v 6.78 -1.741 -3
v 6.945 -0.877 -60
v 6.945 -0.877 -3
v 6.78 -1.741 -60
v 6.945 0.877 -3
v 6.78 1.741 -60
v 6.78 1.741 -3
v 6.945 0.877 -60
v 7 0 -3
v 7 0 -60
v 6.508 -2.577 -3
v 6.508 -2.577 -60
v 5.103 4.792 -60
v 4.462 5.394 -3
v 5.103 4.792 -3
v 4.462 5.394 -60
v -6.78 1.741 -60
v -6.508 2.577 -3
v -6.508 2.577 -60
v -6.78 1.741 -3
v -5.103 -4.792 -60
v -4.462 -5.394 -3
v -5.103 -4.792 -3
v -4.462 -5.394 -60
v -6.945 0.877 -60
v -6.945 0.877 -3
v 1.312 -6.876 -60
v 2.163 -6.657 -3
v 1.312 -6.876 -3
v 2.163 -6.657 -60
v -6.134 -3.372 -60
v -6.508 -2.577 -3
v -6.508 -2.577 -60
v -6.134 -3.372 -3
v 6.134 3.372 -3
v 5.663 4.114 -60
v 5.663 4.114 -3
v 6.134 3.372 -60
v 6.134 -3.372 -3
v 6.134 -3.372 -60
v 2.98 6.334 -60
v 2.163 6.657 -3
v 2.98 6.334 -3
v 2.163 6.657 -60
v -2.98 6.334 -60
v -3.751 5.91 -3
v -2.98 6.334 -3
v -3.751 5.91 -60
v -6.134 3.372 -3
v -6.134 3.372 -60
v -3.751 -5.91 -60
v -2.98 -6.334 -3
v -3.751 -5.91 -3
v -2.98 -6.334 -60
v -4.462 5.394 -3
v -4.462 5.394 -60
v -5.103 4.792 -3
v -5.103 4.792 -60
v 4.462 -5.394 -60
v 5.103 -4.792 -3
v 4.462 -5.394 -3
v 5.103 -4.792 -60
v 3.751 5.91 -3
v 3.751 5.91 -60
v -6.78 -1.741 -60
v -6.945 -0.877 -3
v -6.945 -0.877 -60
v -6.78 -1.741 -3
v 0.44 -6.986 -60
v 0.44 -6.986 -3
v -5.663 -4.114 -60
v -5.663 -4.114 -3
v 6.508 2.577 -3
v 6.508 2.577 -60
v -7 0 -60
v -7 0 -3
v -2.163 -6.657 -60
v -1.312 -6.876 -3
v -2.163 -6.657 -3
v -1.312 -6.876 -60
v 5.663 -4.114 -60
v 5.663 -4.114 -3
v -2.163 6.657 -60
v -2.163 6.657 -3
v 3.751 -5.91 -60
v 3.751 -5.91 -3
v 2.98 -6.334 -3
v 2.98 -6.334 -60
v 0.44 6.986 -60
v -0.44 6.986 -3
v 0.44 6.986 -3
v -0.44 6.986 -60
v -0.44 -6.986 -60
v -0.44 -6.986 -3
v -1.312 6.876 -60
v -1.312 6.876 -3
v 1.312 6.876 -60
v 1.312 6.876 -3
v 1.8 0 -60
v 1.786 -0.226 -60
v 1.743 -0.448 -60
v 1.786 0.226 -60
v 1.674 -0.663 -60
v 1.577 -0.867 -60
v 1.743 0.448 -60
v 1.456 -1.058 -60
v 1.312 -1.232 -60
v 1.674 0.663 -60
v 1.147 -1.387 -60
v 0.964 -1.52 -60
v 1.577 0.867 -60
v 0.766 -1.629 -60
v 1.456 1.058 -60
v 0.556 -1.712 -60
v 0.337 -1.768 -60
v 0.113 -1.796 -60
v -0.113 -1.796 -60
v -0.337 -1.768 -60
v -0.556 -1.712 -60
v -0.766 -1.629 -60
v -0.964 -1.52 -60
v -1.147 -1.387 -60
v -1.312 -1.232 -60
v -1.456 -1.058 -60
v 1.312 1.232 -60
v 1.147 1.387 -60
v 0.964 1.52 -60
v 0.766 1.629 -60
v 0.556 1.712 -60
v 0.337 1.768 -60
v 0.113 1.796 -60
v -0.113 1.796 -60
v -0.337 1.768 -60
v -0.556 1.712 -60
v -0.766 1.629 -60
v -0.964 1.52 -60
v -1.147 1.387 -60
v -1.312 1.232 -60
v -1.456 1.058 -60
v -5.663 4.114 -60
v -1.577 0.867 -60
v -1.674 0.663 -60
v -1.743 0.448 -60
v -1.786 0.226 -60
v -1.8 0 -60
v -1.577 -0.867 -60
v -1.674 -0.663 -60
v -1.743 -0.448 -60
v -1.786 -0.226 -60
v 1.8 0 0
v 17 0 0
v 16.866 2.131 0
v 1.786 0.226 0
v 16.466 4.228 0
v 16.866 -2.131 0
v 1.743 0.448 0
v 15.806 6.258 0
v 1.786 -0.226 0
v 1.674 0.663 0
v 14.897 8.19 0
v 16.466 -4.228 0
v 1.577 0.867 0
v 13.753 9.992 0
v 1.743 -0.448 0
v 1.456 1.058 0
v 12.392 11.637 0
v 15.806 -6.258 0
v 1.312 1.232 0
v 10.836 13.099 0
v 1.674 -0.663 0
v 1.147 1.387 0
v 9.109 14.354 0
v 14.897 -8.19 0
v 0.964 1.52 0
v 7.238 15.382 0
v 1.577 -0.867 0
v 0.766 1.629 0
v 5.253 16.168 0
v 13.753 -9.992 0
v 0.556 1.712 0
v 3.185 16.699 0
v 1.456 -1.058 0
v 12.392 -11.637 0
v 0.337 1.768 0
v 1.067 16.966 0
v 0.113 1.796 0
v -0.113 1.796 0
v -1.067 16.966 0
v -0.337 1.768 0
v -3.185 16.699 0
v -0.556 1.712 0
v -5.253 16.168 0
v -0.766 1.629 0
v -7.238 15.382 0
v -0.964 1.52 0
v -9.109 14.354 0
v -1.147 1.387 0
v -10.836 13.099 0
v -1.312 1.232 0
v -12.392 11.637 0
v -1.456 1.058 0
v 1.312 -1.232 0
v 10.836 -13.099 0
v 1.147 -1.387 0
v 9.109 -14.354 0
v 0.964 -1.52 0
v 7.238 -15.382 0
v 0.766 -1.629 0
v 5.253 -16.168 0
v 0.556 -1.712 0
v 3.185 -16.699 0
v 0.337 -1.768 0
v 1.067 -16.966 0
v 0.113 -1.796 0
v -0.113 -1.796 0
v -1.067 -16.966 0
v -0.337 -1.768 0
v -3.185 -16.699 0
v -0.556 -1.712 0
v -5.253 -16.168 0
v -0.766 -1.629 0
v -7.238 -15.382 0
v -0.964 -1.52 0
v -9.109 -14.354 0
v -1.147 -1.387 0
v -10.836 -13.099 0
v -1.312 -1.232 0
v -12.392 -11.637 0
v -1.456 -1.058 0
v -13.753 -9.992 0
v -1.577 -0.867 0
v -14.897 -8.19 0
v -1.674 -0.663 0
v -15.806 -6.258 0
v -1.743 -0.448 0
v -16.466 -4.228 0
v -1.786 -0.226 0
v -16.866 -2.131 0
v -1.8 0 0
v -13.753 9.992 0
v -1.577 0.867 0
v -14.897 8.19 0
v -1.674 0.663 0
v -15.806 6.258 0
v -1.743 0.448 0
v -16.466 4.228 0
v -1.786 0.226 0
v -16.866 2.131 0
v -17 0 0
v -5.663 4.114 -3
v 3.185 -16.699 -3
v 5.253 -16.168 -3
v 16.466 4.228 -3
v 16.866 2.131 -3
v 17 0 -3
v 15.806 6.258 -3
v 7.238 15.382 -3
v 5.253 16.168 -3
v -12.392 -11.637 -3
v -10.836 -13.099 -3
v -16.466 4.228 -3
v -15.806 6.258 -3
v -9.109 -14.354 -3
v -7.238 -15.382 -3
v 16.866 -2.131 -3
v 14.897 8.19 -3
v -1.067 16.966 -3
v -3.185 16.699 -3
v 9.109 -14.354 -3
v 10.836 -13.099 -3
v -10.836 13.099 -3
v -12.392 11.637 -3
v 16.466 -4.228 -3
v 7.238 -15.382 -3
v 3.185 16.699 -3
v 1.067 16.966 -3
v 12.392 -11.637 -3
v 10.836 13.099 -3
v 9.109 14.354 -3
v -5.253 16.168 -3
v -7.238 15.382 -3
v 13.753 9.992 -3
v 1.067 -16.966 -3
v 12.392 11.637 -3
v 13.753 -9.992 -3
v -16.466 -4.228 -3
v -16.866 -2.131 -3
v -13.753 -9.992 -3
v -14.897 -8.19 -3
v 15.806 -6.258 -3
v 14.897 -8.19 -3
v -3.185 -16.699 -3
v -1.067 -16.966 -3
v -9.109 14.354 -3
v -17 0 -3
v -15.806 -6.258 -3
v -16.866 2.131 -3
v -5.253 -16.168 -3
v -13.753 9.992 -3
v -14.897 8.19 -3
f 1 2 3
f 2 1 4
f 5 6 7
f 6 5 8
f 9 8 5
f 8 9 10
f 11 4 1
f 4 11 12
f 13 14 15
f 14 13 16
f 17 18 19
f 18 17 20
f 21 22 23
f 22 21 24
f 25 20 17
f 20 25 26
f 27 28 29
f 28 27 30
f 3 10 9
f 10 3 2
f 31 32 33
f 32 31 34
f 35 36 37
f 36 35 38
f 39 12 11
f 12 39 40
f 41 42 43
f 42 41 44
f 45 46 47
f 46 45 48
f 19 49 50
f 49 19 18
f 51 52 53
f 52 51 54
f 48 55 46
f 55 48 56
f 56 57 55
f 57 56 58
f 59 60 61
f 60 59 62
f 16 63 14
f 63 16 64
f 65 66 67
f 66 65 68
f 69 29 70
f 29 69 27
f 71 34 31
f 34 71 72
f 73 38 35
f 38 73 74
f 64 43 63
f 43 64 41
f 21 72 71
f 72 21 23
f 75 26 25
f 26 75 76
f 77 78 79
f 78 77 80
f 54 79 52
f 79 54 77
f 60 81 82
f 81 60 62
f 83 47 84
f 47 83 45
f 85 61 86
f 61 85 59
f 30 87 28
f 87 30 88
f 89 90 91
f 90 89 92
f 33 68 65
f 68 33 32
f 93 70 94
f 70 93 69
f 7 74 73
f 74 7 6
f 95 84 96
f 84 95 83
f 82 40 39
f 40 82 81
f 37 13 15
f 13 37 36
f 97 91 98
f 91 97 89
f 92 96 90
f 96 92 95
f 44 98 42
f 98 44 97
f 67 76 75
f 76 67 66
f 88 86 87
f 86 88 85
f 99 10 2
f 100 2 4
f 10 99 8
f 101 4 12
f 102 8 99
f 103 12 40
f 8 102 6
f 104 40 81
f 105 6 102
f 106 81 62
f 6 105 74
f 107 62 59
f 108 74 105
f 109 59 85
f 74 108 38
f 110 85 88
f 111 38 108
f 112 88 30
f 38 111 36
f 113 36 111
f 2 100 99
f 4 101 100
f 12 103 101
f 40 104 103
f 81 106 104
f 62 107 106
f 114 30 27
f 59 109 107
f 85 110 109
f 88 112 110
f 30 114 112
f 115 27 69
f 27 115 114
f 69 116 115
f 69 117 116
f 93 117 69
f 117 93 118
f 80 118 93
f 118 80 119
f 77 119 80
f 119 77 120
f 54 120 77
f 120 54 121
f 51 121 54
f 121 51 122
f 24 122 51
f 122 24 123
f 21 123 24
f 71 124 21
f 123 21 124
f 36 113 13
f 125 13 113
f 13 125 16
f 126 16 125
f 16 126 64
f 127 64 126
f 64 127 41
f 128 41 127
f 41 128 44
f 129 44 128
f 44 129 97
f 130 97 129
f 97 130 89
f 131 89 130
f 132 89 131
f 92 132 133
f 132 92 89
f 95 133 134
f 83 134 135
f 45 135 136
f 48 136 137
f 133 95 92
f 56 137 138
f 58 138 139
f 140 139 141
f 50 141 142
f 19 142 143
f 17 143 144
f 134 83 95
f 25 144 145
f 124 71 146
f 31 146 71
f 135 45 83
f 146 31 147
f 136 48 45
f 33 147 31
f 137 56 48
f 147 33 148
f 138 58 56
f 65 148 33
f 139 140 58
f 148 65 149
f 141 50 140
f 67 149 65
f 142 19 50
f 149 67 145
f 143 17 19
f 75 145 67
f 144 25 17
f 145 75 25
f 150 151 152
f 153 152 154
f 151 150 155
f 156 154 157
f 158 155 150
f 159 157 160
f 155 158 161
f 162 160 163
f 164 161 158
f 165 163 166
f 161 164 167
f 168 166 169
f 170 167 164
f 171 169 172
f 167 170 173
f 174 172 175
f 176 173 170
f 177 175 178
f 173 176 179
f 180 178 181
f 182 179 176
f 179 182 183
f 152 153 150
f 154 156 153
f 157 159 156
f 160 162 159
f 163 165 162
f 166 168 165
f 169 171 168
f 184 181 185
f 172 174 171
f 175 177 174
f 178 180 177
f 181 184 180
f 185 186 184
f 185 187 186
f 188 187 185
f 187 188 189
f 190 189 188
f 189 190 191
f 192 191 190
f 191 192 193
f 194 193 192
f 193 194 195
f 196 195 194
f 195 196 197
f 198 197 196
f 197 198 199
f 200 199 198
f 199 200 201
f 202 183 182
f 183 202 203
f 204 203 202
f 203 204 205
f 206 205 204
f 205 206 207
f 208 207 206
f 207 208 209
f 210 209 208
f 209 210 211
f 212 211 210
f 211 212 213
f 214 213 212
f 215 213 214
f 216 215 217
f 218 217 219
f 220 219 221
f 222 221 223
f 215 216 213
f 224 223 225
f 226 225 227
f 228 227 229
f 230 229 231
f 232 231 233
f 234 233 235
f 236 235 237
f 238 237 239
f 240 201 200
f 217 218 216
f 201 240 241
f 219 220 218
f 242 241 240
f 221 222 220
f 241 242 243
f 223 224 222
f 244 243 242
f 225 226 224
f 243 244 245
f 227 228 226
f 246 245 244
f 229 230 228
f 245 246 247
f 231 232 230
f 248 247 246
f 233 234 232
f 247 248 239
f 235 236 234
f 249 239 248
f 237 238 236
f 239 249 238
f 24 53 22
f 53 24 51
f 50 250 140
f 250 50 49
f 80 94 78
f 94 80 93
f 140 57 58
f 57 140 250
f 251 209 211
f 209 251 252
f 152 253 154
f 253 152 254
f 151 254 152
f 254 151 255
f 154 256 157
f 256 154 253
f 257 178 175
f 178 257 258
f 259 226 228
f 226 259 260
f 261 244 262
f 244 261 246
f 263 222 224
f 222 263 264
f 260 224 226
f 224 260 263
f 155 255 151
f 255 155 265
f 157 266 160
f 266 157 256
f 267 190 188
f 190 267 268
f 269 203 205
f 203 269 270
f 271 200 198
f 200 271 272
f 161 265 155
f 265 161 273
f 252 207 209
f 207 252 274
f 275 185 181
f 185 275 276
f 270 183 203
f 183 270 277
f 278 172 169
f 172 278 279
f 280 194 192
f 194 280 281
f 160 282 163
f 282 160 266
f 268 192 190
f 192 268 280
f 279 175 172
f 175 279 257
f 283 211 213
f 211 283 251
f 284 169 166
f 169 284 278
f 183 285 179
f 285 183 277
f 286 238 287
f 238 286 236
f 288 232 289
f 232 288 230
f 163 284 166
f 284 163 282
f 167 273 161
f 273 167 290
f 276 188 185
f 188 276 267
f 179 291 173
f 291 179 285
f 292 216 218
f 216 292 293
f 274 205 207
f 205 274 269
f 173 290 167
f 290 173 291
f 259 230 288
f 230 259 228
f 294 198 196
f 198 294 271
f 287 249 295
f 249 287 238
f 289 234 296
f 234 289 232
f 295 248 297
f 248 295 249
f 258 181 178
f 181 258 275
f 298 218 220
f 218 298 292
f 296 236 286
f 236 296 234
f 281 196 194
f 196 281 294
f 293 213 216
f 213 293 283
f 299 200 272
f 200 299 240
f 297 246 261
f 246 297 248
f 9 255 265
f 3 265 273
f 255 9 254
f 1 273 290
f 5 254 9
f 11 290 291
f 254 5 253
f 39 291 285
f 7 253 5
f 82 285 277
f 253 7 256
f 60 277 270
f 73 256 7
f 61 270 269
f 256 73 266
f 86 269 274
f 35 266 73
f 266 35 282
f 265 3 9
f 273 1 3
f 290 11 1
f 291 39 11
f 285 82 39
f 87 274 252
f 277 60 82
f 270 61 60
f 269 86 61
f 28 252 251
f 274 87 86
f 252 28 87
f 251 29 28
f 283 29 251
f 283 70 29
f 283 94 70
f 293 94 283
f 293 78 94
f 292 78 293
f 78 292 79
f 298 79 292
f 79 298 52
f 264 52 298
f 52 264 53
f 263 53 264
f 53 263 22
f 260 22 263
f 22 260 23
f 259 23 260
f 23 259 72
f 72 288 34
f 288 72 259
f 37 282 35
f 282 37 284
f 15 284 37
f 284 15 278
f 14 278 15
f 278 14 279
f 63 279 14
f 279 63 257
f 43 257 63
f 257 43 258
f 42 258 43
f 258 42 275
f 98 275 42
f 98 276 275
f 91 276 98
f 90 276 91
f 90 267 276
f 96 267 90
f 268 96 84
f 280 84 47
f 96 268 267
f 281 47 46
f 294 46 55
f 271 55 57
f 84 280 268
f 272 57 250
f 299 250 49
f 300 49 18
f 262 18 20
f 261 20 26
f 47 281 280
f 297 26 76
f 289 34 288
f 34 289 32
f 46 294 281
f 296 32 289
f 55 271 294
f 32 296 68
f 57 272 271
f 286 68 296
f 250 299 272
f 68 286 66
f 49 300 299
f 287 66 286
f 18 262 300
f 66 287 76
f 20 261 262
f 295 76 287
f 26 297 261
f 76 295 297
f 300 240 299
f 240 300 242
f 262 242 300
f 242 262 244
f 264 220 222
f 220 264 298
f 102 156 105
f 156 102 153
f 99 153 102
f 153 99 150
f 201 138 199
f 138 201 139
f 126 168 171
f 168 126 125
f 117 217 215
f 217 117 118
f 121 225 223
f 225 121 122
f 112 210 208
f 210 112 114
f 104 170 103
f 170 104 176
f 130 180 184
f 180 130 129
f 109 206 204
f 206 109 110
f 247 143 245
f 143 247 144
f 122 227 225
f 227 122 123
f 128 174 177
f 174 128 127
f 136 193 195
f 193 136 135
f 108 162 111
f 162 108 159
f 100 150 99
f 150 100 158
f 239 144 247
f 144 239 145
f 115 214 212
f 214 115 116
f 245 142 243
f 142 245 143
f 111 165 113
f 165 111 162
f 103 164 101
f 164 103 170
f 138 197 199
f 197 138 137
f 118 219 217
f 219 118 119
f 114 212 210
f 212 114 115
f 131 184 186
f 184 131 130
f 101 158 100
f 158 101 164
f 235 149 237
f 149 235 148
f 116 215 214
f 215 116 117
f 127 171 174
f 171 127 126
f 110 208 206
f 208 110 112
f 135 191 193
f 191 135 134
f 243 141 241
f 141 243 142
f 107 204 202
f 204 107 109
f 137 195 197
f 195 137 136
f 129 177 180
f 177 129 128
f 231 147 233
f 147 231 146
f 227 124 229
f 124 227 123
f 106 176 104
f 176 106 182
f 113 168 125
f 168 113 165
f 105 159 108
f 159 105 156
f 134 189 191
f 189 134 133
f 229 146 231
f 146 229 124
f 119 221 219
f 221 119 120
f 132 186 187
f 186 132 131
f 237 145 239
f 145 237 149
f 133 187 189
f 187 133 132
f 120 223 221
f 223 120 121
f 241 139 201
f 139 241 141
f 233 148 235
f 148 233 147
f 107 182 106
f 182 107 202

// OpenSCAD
$fn = 50;


difference() {
	union() {
		translate(v = [0, 0, -60.0000000000]) {
			cylinder(h = 60, r = 7.0000000000);
		}
		translate(v = [0, 0, -3.0000000000]) {
			cylinder(h = 3, r = 17.0000000000);
		}
	}
	union() {
		#translate(v = [0, 0, -60]) {
			cylinder(h = 60, r = 1.8000000000);
		}
	}
}
